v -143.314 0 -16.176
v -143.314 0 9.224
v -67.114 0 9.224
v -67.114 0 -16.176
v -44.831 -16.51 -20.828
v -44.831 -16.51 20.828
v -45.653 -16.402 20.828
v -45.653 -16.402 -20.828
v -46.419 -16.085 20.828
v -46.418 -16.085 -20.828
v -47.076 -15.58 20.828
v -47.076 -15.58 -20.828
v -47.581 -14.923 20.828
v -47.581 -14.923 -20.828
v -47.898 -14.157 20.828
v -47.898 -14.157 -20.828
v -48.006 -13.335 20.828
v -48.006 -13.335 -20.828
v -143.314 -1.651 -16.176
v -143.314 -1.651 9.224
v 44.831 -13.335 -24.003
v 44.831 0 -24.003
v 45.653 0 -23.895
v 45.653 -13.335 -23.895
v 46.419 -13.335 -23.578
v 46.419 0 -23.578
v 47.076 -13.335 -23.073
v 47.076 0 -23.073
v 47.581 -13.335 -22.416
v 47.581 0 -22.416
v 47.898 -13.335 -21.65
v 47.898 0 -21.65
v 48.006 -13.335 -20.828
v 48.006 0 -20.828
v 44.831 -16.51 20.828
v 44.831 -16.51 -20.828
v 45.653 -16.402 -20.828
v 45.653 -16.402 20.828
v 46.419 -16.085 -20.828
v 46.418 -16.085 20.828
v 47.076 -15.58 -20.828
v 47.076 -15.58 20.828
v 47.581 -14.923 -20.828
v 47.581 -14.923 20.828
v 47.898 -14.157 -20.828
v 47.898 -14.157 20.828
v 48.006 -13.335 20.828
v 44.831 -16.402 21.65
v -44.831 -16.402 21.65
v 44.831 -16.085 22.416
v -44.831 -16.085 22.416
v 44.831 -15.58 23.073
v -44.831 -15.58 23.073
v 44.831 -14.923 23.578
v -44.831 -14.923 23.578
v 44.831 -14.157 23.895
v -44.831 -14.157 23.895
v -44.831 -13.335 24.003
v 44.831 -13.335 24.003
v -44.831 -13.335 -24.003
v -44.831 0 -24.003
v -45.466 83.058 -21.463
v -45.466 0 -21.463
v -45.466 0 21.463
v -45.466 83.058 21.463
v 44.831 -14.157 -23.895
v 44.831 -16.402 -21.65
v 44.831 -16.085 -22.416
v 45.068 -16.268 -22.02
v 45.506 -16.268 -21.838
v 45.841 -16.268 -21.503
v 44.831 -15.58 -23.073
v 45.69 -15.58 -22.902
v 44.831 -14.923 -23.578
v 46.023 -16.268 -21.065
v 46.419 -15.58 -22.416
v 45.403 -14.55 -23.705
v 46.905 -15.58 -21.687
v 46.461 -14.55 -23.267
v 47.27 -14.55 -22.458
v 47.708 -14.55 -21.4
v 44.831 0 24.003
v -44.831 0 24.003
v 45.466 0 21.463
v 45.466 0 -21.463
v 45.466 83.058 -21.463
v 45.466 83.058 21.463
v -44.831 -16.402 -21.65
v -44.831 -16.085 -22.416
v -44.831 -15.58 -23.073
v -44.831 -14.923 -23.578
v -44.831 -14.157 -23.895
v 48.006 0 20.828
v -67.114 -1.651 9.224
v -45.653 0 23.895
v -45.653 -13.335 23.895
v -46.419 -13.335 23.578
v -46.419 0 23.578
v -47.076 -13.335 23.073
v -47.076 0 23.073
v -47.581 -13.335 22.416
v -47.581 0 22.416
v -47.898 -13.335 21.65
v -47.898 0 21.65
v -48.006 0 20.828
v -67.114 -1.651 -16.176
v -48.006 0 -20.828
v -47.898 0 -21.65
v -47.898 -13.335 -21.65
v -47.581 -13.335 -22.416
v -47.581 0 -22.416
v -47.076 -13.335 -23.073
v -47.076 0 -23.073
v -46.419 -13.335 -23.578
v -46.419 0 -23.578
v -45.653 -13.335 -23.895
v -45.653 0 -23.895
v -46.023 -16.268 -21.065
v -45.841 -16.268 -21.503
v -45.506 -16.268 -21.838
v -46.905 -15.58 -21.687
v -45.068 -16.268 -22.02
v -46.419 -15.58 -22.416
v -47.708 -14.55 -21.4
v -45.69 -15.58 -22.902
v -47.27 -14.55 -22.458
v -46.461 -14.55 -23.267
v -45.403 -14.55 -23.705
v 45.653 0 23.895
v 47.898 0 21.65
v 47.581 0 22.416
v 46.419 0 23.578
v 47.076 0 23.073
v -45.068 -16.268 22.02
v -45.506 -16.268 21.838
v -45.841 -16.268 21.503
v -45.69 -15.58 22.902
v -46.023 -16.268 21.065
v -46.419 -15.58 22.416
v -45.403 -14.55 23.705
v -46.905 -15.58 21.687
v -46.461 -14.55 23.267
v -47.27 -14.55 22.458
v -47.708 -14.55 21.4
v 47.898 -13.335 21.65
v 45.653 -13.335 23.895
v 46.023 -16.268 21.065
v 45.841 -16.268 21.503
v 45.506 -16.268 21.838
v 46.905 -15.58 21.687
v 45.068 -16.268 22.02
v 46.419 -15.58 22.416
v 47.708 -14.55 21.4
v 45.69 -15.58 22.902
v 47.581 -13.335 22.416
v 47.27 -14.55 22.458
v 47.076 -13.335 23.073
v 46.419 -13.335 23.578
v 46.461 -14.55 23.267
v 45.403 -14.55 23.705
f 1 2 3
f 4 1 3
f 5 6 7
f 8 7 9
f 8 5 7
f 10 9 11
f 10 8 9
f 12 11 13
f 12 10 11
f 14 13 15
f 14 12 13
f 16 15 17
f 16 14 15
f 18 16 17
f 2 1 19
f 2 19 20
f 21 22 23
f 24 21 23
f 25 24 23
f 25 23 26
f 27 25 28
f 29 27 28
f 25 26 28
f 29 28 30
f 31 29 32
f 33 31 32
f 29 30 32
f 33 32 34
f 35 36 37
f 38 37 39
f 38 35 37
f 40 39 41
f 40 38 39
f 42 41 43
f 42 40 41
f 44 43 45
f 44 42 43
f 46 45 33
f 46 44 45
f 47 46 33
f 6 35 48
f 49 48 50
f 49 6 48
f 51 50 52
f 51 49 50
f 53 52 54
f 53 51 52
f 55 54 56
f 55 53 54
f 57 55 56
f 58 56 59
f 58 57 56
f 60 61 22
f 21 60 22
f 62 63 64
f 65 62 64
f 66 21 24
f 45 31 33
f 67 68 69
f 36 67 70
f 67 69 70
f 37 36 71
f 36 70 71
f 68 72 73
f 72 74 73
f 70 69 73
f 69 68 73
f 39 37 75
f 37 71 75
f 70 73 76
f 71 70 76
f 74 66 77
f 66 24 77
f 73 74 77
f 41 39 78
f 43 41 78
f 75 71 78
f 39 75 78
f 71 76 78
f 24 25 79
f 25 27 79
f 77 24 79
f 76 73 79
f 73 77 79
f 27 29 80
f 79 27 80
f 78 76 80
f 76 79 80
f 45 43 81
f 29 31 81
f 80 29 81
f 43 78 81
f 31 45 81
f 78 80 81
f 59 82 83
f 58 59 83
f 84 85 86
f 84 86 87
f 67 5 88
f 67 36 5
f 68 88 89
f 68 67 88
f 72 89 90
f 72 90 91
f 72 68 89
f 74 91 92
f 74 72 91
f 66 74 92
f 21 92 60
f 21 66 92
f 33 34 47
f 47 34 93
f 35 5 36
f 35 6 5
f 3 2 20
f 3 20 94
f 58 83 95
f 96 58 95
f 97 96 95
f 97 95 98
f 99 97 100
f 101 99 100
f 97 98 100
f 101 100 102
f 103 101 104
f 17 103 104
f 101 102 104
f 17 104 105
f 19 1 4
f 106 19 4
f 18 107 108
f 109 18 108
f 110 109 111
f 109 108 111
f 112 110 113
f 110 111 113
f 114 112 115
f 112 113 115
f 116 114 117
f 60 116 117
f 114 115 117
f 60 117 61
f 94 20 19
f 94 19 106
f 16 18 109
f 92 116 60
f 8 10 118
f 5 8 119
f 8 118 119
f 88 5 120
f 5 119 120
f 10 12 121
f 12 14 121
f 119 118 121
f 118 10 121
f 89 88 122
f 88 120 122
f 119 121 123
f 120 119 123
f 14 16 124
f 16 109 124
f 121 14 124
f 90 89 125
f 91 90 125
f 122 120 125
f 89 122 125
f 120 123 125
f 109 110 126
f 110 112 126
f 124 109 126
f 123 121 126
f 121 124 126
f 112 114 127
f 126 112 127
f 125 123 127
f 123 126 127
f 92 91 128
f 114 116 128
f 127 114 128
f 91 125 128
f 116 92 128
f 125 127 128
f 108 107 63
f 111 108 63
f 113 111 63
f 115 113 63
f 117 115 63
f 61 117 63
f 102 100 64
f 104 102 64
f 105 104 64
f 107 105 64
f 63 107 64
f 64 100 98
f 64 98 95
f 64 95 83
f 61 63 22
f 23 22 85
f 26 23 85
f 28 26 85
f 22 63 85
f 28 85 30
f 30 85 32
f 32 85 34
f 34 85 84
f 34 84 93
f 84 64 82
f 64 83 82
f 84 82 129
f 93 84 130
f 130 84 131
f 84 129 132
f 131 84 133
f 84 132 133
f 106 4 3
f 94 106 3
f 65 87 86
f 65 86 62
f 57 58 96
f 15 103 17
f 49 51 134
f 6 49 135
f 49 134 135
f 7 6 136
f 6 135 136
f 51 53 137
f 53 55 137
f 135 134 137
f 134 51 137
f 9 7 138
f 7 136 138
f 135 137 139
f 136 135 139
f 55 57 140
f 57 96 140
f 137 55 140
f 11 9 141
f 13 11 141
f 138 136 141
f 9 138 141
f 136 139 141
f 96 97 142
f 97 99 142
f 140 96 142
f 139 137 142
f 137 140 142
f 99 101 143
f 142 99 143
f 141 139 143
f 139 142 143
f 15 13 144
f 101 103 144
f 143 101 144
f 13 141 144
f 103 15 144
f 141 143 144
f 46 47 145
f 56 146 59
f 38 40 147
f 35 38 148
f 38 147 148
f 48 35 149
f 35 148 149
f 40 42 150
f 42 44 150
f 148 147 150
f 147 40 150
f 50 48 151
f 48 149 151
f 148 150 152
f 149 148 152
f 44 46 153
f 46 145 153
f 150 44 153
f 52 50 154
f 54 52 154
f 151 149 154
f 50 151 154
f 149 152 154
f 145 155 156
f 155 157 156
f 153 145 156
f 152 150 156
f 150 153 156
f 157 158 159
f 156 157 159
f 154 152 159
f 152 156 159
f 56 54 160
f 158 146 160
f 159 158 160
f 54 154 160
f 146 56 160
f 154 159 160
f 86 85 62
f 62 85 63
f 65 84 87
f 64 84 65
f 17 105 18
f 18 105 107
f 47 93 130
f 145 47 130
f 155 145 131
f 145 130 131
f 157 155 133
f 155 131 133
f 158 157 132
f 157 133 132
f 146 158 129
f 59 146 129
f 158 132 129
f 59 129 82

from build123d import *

# Parameters (mm, degrees)
F1_DEPTH = 16.51
F2_W     = 90.932
F2_H     = 42.926
F3_DEPTH = 83.058
F4_W     = 76.2
F4_H     = 25.4
F5_DEPTH = 1.651
F6_R     = 3.175


with BuildPart() as f1:
    # F0 (on Front) → F1 (new body)
    with BuildSketch(Plane.XZ):
        with BuildLine():
            Line((44.831, 24.003), (-44.831, 24.003))
            ThreePointArc((-44.831, 24.003), (-47.0760640303, 23.0730640303), (-48.006, 20.828))
            Line((-48.006, 20.828), (-48.006, -20.828))
            ThreePointArc((-48.006, -20.828), (-47.0760640303, -23.0730640303), (-44.831, -24.003))
            Line((-44.831, -24.003), (44.831, -24.003))
            ThreePointArc((44.831, -24.003), (47.0760640303, -23.0730640303), (48.006, -20.828))
            Line((48.006, -20.828), (48.006, 20.828))
            ThreePointArc((48.006, 20.828), (47.0760640303, 23.0730640303), (44.831, 24.003))
        make_face()
    extrude(amount=F1_DEPTH)

    # F2 (on face) → F3 (join)
    with BuildSketch(Plane(origin=(0, 0, 0), x_dir=(-1, 0, 0), z_dir=(0, 1, 0))):
        Rectangle(F2_W, F2_H)
    extrude(amount=F3_DEPTH)

    # F6
    f6_edges = [f1.edges().sort_by_distance(p)[0] for p in [
        (0, -16.51, -24.003),
    ]]
    fillet(f6_edges, radius=F6_R)


with BuildPart() as f5:
    # F4 (on Front) → F5 (new body)
    with BuildSketch(Plane.XZ):
        with Locations((-105.2142274618, -3.475756231)):
            Rectangle(F4_W, F4_H)
    extrude(amount=F5_DEPTH)


solid = Compound([f1.part, f5.part])
